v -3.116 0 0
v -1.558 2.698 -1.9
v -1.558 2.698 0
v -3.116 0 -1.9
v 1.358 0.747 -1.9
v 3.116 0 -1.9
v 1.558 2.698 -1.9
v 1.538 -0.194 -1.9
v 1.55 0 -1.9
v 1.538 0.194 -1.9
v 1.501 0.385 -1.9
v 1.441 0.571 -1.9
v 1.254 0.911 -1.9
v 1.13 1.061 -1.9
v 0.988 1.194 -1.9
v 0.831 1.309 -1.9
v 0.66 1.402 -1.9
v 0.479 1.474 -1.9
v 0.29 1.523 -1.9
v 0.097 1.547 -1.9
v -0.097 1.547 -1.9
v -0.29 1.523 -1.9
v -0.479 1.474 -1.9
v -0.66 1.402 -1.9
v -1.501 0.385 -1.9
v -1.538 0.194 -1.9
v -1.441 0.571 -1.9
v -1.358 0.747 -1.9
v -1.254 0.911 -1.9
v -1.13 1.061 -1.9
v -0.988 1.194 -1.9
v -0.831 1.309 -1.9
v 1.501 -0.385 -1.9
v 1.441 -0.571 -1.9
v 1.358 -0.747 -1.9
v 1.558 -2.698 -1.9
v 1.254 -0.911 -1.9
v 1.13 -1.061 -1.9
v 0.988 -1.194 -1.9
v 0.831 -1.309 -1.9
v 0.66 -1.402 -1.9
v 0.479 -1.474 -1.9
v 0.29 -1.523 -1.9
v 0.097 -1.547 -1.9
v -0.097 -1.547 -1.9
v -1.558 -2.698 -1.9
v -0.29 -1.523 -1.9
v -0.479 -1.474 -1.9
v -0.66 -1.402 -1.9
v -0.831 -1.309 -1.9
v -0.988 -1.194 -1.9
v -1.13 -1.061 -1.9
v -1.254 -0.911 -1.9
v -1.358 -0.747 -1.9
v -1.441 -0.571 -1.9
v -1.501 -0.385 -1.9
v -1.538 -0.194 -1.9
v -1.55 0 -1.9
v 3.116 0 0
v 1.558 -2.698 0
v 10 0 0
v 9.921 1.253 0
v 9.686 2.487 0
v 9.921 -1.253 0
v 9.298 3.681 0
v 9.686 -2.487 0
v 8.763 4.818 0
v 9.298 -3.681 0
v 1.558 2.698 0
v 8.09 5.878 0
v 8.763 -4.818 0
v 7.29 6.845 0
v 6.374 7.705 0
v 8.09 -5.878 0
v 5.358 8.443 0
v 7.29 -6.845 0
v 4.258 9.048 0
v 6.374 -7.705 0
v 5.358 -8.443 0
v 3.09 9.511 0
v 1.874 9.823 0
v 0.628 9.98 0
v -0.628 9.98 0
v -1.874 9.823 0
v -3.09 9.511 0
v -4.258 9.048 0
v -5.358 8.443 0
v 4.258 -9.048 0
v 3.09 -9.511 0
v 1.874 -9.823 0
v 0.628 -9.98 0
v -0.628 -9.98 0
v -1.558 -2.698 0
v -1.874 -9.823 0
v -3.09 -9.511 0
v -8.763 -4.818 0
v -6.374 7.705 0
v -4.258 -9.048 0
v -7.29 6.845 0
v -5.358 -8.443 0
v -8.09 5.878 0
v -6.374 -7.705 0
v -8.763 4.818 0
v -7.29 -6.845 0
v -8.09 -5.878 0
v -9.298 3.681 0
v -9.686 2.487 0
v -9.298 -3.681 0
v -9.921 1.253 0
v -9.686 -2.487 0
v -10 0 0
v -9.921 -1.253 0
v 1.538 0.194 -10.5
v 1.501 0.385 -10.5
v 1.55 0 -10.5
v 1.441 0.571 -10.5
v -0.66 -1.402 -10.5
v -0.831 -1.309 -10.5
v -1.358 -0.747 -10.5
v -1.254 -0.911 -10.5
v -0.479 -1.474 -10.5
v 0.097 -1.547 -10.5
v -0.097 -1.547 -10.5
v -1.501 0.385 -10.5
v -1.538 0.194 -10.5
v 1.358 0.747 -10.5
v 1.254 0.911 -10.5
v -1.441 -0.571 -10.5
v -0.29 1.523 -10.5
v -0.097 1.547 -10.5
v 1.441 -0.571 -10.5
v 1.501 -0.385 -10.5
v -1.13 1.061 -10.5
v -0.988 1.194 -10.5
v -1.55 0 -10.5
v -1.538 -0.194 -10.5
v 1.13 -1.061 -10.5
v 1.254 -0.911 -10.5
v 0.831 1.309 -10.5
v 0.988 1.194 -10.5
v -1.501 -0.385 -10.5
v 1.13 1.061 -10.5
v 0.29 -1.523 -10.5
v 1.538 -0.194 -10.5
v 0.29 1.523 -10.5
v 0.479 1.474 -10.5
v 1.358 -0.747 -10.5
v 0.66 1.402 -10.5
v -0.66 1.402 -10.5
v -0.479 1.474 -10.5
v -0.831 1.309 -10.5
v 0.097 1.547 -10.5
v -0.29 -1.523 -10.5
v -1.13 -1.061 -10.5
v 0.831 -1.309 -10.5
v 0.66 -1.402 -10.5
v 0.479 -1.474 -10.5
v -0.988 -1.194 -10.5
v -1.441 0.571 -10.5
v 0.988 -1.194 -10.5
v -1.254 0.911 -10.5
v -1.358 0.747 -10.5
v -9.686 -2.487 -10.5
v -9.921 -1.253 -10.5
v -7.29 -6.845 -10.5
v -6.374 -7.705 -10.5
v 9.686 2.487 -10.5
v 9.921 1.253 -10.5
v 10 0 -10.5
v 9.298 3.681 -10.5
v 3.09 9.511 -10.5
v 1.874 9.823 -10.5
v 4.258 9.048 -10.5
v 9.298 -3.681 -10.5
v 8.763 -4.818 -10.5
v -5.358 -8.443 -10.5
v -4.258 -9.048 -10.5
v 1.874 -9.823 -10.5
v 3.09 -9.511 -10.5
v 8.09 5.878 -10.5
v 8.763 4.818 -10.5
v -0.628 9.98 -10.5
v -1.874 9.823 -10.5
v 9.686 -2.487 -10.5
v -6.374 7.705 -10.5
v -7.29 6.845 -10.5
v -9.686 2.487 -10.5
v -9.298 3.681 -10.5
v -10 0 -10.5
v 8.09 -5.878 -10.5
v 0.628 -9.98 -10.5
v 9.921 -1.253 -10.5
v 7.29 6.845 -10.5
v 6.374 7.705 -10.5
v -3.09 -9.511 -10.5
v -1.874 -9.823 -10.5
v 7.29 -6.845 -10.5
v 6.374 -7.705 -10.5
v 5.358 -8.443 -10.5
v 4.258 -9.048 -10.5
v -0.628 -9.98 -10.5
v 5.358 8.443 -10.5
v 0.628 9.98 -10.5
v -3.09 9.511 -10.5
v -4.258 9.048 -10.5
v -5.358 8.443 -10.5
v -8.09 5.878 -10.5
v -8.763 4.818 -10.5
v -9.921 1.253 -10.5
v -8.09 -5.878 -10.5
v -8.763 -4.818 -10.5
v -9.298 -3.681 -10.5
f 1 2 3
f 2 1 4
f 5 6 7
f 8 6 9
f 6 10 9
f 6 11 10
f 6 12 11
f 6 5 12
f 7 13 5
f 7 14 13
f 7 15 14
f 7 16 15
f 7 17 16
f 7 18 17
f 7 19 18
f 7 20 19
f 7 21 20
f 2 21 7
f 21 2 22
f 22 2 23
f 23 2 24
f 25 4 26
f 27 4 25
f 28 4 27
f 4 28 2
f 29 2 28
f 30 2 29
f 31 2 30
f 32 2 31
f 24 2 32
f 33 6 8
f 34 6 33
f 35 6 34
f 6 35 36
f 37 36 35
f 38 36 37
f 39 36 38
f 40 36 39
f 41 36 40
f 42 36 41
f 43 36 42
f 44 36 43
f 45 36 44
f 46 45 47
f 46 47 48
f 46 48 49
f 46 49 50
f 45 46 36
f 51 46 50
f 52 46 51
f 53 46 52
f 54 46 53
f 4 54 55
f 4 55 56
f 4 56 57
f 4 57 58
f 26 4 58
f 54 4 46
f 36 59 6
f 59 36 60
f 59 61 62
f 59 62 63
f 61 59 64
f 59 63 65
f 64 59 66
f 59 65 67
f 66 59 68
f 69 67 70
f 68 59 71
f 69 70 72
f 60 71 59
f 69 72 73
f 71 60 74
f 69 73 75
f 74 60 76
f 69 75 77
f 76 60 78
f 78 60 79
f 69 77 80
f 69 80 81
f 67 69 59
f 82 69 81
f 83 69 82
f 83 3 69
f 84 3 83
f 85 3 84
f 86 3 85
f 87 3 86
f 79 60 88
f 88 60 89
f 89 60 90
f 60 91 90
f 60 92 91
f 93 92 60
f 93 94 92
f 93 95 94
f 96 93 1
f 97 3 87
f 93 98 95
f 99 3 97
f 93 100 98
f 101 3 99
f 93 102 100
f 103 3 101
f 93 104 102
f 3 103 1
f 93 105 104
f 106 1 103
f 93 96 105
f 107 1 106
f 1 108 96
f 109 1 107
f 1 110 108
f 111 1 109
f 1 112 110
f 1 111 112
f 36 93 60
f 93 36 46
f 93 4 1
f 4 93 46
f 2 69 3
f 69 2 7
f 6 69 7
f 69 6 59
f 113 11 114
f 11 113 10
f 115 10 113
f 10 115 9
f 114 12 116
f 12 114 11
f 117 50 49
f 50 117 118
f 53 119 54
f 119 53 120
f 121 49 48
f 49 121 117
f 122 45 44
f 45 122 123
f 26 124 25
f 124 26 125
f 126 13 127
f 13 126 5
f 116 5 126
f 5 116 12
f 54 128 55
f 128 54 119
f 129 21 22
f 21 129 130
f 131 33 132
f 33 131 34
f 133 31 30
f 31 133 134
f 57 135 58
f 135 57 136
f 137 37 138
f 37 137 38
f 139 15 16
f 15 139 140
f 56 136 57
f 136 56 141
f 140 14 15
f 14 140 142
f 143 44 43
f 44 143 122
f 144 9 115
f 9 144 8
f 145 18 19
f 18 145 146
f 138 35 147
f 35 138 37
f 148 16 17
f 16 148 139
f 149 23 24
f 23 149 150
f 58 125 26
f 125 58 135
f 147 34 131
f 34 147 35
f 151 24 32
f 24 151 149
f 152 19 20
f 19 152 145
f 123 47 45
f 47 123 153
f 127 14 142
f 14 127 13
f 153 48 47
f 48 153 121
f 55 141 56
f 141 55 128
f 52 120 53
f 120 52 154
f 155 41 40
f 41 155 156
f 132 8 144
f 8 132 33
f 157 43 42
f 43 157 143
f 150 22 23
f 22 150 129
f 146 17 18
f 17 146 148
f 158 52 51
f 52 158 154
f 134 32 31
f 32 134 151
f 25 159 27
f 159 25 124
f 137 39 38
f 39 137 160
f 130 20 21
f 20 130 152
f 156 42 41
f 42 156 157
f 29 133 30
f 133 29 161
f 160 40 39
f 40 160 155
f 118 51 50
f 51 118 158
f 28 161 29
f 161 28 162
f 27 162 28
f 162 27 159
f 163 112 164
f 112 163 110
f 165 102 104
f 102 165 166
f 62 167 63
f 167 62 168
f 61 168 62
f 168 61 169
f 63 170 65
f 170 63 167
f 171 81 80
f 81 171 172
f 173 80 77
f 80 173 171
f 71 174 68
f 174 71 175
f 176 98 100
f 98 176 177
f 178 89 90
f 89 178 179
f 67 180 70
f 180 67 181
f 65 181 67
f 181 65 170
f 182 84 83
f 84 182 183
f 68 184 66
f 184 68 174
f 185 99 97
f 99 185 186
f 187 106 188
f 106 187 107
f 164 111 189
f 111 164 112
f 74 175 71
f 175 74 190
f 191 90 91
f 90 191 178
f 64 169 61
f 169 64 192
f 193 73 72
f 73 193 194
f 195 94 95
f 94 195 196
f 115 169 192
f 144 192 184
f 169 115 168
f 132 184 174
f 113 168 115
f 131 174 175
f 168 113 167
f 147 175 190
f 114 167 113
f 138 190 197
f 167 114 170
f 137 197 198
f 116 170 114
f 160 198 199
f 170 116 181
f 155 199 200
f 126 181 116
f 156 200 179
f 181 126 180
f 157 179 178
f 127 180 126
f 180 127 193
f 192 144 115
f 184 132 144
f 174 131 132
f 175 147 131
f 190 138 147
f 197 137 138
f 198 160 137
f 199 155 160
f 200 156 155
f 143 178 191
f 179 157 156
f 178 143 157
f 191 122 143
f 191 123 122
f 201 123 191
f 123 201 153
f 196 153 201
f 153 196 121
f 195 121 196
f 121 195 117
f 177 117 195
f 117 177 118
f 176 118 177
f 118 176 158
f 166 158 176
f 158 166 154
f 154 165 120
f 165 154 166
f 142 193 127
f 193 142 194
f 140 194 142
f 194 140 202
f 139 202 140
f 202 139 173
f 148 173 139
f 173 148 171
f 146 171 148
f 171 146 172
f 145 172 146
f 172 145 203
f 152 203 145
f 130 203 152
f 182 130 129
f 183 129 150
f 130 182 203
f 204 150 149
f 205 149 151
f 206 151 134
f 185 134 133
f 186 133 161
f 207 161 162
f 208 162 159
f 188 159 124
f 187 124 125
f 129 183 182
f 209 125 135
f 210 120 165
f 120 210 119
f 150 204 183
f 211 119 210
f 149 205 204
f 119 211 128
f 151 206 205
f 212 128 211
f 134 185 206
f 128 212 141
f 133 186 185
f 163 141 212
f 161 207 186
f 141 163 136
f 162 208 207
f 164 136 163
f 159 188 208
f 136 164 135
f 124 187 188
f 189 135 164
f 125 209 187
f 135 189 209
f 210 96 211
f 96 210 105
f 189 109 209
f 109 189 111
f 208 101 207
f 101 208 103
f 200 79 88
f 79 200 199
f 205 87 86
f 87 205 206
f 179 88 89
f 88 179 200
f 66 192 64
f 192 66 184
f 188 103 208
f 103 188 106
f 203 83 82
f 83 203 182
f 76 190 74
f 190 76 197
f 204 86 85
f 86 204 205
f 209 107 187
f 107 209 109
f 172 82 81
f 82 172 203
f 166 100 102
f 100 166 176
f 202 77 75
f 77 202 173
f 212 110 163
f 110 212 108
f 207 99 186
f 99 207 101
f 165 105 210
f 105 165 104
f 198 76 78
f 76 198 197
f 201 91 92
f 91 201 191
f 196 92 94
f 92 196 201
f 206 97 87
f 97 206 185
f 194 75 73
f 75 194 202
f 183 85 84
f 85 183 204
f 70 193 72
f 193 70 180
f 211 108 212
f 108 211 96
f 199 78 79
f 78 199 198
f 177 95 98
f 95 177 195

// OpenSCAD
$fn = 50;


difference() {
	union() {
		translate(v = [0, 0, -10.5000000000]) {
			cylinder(h = 10.5000000000, r = 10.0000000000);
		}
	}
	union() {
		translate(v = [0, 0, 0]) {
			rotate(a = [0, 0, 0]) {
				difference() {
					union() {
						translate(v = [0, 0, -1.9000000000]) {
							linear_extrude(height = 1.9000000000) {
								polygon(points = [[3.1158000000, 0.0000000000], [1.5579000000, 2.6983619531], [-1.5579000000, 2.6983619531], [-3.1158000000, 0.0000000000], [-1.5579000000, -2.6983619531], [1.5579000000, -2.6983619531]]);
							}
						}
					}
					union();
				}
			}
		}
		#translate(v = [0, 0, -100.0000000000]) {
			cylinder(h = 200, r = 1.5500000000);
		}
	}
}
